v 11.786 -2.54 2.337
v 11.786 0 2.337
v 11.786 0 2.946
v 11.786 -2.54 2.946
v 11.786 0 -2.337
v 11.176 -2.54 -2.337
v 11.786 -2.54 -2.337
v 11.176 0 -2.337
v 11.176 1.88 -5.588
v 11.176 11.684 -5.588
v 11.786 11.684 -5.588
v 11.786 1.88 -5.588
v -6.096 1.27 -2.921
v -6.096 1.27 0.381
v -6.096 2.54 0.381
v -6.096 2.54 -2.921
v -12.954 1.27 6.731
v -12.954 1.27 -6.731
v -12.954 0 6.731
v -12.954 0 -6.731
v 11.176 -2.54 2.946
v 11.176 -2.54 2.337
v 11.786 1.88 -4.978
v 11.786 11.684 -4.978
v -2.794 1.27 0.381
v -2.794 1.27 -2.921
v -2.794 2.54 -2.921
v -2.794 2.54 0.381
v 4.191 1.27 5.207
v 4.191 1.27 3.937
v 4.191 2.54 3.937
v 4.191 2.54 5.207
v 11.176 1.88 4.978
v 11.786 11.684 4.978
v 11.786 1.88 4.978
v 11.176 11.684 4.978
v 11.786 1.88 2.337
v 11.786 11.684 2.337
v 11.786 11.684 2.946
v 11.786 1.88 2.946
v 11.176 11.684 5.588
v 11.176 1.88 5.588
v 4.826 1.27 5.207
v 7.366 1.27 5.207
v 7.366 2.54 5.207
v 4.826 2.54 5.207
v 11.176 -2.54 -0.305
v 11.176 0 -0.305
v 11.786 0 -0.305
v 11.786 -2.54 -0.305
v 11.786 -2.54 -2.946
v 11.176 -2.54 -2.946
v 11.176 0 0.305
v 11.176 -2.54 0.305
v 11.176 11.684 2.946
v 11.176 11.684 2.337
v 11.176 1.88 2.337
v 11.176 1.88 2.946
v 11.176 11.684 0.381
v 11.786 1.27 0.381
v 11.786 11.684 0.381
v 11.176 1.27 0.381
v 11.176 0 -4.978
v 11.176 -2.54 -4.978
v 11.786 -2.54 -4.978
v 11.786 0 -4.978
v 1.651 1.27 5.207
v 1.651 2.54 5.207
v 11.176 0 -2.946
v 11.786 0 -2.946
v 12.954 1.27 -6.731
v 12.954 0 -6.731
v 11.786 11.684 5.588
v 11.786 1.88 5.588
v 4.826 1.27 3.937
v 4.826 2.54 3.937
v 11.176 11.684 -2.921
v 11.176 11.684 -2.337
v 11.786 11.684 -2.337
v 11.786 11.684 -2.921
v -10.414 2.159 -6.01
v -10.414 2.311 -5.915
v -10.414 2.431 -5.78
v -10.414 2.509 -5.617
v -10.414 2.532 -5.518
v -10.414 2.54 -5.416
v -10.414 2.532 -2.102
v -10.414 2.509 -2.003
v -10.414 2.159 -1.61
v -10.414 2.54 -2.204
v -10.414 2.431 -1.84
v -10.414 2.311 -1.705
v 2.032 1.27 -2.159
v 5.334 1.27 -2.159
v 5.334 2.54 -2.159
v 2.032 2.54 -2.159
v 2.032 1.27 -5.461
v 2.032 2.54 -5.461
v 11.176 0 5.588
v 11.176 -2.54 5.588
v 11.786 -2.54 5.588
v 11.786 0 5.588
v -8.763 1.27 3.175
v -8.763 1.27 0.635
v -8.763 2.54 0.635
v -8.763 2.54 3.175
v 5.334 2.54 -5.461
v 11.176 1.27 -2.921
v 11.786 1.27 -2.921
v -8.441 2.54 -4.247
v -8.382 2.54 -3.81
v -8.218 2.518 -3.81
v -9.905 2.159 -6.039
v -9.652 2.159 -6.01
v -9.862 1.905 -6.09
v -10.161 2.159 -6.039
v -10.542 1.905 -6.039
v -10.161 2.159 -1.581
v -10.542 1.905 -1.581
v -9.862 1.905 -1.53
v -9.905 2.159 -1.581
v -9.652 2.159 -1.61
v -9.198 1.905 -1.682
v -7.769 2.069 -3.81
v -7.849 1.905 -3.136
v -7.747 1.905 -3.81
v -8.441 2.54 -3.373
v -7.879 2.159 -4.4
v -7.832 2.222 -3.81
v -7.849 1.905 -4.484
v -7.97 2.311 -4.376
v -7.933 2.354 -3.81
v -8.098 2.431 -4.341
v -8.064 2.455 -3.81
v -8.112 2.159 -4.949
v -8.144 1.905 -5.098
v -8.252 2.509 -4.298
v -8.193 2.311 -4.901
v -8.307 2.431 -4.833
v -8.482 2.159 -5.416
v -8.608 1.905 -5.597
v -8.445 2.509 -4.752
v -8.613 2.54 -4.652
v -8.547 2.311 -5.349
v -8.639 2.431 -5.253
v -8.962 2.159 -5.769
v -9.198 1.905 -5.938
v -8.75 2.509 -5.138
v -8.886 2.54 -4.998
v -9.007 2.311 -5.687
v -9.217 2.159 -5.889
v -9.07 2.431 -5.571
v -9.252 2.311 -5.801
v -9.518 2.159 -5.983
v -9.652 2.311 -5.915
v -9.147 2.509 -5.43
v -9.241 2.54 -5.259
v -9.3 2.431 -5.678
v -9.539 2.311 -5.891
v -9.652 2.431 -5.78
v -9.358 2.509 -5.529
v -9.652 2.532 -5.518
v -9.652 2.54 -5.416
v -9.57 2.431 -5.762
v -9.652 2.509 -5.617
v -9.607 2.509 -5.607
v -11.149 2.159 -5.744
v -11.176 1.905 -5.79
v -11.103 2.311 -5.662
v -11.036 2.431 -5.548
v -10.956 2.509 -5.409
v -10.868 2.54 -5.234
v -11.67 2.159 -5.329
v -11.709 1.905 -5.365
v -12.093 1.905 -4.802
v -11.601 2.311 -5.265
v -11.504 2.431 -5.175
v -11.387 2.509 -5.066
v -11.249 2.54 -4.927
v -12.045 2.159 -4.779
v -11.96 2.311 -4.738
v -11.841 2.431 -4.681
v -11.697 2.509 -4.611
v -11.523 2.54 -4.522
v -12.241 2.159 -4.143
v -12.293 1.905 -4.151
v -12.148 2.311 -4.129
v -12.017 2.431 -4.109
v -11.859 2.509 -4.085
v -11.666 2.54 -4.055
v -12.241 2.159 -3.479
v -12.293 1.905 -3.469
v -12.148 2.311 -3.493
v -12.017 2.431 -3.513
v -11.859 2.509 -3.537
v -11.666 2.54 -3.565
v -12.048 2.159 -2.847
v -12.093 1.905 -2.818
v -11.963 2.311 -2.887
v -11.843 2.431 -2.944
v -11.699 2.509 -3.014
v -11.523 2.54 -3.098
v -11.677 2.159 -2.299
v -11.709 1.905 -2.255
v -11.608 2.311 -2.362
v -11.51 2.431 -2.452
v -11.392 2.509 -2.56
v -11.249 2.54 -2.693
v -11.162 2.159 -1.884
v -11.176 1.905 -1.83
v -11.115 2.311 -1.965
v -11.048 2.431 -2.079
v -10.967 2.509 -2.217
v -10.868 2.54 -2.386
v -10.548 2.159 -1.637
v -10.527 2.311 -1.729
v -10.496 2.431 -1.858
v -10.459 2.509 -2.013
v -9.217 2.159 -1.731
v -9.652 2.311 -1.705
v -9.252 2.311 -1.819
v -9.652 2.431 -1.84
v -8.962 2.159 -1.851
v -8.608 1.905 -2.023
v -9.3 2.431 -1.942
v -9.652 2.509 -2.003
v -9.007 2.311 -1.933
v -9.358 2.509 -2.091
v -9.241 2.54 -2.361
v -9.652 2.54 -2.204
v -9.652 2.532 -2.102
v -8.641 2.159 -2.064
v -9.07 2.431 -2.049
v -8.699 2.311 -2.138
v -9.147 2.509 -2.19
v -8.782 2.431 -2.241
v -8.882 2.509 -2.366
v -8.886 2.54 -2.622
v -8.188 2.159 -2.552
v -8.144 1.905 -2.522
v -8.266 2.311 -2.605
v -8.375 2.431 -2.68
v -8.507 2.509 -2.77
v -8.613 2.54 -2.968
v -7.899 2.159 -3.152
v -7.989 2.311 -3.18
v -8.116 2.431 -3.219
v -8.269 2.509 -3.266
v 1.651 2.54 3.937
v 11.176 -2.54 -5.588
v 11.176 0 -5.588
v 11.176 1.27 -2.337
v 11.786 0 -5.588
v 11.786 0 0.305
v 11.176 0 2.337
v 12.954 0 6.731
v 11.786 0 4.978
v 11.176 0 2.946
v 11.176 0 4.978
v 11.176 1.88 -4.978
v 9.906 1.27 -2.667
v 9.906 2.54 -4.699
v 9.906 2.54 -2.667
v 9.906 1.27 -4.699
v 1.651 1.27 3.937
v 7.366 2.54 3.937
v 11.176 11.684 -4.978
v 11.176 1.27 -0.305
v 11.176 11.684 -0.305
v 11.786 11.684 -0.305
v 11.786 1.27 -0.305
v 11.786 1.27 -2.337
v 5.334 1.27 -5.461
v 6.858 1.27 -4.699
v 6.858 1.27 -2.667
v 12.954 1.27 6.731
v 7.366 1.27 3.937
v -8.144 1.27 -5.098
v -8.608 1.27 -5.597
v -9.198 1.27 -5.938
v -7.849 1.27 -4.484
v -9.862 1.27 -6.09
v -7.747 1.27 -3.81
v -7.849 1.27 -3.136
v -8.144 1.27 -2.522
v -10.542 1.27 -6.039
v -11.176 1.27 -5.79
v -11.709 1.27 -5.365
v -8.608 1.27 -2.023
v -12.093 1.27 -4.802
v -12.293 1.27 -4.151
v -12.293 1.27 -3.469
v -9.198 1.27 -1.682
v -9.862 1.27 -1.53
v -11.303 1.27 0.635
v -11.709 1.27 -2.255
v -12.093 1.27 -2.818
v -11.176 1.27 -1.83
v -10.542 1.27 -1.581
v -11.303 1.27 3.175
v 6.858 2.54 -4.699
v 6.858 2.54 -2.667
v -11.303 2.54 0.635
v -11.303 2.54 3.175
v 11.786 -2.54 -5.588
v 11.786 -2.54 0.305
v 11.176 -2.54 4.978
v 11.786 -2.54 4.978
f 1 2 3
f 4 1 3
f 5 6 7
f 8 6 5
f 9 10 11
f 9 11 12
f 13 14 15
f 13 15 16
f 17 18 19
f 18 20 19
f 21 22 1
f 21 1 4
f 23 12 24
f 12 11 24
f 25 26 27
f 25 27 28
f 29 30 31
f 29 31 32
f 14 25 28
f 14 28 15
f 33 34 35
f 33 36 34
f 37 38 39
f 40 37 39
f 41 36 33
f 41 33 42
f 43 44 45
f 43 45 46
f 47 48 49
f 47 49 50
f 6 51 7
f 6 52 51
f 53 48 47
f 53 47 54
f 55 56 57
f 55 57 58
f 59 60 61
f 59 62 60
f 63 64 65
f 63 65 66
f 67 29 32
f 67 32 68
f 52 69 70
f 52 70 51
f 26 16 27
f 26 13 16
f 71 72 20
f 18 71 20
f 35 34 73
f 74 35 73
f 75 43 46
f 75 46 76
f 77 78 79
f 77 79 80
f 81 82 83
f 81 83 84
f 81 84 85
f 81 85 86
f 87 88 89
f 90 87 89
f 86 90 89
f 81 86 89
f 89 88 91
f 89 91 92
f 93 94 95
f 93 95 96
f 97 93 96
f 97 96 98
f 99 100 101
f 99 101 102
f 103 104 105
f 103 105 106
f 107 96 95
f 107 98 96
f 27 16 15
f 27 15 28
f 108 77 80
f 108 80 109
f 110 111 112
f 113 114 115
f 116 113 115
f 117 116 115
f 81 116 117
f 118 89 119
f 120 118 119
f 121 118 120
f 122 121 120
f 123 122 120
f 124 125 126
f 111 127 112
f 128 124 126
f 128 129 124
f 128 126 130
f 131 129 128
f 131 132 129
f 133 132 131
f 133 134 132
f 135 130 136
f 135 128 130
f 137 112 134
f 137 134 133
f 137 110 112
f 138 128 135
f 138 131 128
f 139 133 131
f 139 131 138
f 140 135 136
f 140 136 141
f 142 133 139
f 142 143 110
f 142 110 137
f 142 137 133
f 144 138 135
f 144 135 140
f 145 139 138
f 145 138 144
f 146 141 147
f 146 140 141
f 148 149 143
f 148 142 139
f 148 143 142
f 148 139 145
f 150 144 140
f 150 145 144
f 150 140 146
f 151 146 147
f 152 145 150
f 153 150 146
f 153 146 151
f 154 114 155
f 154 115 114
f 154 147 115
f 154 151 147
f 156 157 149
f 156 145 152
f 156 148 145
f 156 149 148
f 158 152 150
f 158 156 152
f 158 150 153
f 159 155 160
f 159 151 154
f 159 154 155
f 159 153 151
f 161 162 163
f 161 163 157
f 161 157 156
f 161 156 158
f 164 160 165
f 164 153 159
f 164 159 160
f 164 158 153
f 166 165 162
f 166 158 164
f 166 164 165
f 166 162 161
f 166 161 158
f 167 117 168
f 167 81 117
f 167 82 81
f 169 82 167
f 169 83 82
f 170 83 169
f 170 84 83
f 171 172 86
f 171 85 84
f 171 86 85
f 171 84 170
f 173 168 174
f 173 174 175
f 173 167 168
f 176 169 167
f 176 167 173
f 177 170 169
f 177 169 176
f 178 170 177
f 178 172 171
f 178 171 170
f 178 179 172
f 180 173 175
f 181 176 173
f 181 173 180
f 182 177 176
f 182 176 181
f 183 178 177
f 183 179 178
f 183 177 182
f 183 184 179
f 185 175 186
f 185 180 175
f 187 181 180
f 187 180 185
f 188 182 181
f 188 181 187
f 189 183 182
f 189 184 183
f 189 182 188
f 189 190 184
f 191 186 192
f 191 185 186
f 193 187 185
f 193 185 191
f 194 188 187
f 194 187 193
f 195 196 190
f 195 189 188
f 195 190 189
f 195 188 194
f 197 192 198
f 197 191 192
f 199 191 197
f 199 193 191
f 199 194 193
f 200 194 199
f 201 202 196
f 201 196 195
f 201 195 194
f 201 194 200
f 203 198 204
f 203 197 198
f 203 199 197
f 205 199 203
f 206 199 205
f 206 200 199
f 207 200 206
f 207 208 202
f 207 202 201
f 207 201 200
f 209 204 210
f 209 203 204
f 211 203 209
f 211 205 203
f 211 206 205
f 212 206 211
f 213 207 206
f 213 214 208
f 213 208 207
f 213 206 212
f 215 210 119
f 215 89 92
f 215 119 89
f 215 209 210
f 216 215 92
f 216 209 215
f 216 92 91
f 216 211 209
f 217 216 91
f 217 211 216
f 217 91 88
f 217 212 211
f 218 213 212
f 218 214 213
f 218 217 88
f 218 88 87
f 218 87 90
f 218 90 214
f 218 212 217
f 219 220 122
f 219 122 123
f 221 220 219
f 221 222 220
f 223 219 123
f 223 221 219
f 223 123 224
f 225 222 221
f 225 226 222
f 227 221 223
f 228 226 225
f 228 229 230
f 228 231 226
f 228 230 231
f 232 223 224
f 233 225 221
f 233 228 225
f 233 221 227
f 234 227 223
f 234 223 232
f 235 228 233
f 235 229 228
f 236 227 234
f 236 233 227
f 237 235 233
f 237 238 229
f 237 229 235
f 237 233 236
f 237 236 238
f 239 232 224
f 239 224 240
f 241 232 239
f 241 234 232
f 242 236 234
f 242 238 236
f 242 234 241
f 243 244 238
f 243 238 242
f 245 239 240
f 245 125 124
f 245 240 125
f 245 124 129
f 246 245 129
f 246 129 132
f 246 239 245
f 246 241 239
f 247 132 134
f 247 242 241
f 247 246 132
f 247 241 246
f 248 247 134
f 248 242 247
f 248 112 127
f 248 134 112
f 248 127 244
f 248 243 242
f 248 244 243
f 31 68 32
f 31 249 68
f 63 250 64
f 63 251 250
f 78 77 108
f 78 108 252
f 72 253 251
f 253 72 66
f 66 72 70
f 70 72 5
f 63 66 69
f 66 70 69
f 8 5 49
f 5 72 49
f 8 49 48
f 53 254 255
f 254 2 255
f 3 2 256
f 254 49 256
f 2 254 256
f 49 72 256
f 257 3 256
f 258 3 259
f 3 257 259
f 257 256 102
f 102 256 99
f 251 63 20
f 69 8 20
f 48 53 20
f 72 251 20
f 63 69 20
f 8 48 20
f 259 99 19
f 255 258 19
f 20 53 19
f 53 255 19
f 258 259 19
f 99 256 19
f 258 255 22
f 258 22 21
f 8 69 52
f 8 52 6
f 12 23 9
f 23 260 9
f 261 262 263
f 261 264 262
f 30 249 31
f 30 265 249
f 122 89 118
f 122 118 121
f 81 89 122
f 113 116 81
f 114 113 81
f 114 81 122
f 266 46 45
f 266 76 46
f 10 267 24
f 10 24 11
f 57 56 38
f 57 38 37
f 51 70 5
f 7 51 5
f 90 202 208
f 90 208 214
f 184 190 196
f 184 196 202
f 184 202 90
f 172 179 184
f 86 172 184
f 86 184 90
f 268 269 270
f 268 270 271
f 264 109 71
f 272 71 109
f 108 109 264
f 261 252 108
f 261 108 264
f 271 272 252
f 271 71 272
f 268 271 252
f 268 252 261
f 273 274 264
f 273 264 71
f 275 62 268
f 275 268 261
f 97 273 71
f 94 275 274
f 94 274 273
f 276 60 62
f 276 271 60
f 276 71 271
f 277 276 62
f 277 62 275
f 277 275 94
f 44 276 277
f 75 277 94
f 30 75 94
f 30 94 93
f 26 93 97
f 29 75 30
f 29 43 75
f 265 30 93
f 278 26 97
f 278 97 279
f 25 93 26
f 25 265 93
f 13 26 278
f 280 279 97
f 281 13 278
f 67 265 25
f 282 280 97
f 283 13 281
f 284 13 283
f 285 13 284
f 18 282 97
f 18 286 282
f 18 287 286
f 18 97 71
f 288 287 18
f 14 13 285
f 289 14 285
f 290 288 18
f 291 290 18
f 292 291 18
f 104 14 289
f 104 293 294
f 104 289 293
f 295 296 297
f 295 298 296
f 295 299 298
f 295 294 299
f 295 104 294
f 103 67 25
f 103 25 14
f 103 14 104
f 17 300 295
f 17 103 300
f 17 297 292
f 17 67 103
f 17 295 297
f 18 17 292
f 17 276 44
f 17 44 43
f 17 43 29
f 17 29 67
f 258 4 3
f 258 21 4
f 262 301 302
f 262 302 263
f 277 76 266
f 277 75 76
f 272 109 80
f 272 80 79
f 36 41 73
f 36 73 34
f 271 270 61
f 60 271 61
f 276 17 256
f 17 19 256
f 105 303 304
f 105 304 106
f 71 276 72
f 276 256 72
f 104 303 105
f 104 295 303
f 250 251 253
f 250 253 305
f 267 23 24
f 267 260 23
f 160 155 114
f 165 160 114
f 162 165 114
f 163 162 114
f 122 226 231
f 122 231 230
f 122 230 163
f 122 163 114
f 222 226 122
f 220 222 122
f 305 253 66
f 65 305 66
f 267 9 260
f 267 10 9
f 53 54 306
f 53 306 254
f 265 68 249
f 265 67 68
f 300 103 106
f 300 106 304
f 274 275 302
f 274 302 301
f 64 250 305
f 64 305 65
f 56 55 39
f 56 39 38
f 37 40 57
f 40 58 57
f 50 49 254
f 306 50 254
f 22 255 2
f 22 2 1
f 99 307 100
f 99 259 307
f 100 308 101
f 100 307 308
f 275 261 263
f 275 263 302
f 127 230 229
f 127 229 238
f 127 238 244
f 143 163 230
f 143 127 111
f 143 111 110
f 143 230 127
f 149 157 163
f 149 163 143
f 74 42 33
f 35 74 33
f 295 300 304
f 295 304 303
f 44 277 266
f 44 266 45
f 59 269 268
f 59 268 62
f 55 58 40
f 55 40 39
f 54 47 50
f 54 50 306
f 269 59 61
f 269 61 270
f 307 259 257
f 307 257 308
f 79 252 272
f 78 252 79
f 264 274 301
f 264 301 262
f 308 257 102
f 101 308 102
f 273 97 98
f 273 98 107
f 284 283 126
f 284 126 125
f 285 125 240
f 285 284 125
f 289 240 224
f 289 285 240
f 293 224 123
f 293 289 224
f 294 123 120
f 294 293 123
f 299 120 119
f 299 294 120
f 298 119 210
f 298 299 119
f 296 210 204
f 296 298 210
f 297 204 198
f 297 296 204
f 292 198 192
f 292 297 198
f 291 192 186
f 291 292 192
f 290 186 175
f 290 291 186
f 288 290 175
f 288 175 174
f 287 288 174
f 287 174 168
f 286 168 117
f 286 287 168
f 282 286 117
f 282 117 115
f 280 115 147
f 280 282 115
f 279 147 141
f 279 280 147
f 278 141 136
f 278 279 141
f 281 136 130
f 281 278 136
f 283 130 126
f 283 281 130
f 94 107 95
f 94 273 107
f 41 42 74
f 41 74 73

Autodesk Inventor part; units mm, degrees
ref_plane "YZ Plane" through (0, 0, 0) normal (1, 0, 0) x (0, 1, 0)
ref_plane "XZ Plane" through (0, 0, 0) normal (0, 1, 0) x (-1, 0, 0)
sketch "Sketch1" plane through (0, 0, 0) normal (0, 1, 0) x (-1, 0, 0)
  line L0 (12.954, 6.731) -> (-12.954, 6.731)
  line L1 (-12.954, 6.731) -> (-12.954, -6.731)
  line L2 (-12.954, -6.731) -> (12.954, -6.731)
  line L3 (12.954, -6.731) -> (12.954, 6.731)
  point P0 (0, 0)
  point P1 (12.954, 0)
  point P2 (0, -6.731)
  dimension "d0" = 25.908
  dimension "d1" = 13.462
extrude "Extrusion1" add sketch "Sketch1" along normal blind 1.27
sketch "Sketch2" plane through (0, 1.27, 0) normal (0, 1, 0) x (1, 0, 0)
  circle A0 centre (-10.033, 3.81) radius 2.286
  line L0 (-12.954, 6.731) -> (-12.954, -6.731) projected
  line L1 (-11.303, -0.635) -> (-8.763, -0.635)
  line L2 (-8.763, -0.635) -> (-8.763, -3.175)
  line L3 (-8.763, -3.175) -> (-11.303, -3.175)
  line L4 (-11.303, -3.175) -> (-11.303, -0.635)
  line L5 (-12.954, -6.731) -> (12.954, -6.731) projected
  line L6 (-6.096, 2.921) -> (-2.794, 2.921)
  line L7 (-2.794, 2.921) -> (-2.794, -0.381)
  line L8 (-2.794, -0.381) -> (-6.096, -0.381)
  line L9 (-6.096, -0.381) -> (-6.096, 2.921)
  line L10 (12.954, 6.731) -> (-12.954, 6.731) projected
  line L11 (2.032, 5.461) -> (5.334, 5.461)
  line L12 (5.334, 5.461) -> (5.334, 2.159)
  line L13 (5.334, 2.159) -> (2.032, 2.159)
  line L14 (2.032, 2.159) -> (2.032, 5.461)
  line L15 (12.954, -6.731) -> (12.954, 6.731) projected
  line L16 (6.858, 4.699) -> (9.906, 4.699)
  line L17 (9.906, 4.699) -> (9.906, 2.667)
  line L18 (9.906, 2.667) -> (6.858, 2.667)
  line L19 (6.858, 2.667) -> (6.858, 4.699)
  line L20 (1.651, -3.937) -> (4.191, -3.937)
  line L21 (4.191, -3.937) -> (4.191, -5.207)
  line L22 (4.191, -5.207) -> (1.651, -5.207)
  line L23 (1.651, -5.207) -> (1.651, -3.937)
  line L24 (4.826, -3.937) -> (7.366, -3.937)
  line L25 (7.366, -3.937) -> (7.366, -5.207)
  line L26 (7.366, -5.207) -> (4.826, -5.207)
  line L27 (4.826, -5.207) -> (4.826, -3.937)
  point P0 (0, 0)
  point P1 (-10.033, -0.635)
  dimension "d5" = 4.572
  dimension "d9" = 2.921
  dimension "d10" = 3.81
  dimension "d11" = 2.54
  dimension "d12" = 2.54
  dimension "d13" = 3.556
  dimension "d14" = 3.302
  dimension "d15" = 3.302
  dimension "d16" = 6.858
  dimension "d17" = 3.81
  dimension "d18" = 3.302
  dimension "d19" = 3.302
  dimension "d20" = 7.62
  dimension "d21" = 1.27
  dimension "d22" = 3.048
  dimension "d23" = 2.032
  dimension "d24" = 2.032
  dimension "d25" = 3.048
  dimension "d26" = 1.524
  dimension "d27" = 2.54
  dimension "d28" = 2.54
  dimension "d29" = 1.27
  dimension "d30" = 0.635
  dimension "d31" = 5.588
extrude "Extrusion2" add sketch "Sketch2" along normal blind 1.27 contours A0 | L1 L2 L3 L4 | L6 L7 L8 L9 | L11 L12 L13 L14 | L16 L17 L18 L19 | L20 L21 L22 L23 | L24 L25 L26 L27
fillet "Fillet1" radius 0.635 1 edges at (-12.319, 2.54, -3.81)
sketch "Sketch3" plane through (-10.033, 2.54, -3.81) normal (0, 1, 0) x (1, 0, 0)
  circle A0 centre (0, 0) radius 2.286 projected
  line L0 (-0.381, 2.254) -> (-0.381, -2.254)
  line L1 (0.381, 2.254) -> (0.381, -2.254)
  point P0 (10.033, -3.81)
  dimension "d35" = 0.762
  dimension "d36" = 0.381
extrude "Extrusion3" cut sketch "Sketch3" against normal blind 0.381 contours L1 A0 L0
ref_plane "Work Plane1" through (11.176, 1.5748, -5.588) normal (-1, 0, 0) x (0, 0, 1)
sketch "Sketch5" plane through (11.176, 1.5748, -5.588) normal (-1, 0, 0) x (0, 0, 1)
  line L0 (10.5664, -0.3048) -> (11.176, -0.3048) projected
  line L1 (10.5664, -0.3048) -> (10.5664, 0.3048) projected
  line L2 (11.176, 0.3048) -> (10.5664, 0.3048) projected
  line L3 (11.176, -0.3048) -> (11.176, 0.3048) projected
  line L4 (7.9248, -0.3048) -> (8.5344, -0.3048) projected
  line L5 (7.9248, -0.3048) -> (7.9248, 0.3048) projected
  line L6 (8.5344, 0.3048) -> (7.9248, 0.3048) projected
  line L7 (8.5344, -0.3048) -> (8.5344, 0.3048) projected
  line L8 (5.2832, -0.3048) -> (5.8928, -0.3048) projected
  line L9 (5.2832, -0.3048) -> (5.2832, 0.3048) projected
  line L10 (5.8928, 0.3048) -> (5.2832, 0.3048) projected
  line L11 (5.8928, -0.3048) -> (5.8928, 0.3048) projected
  line L12 (2.6416, -0.3048) -> (3.2512, -0.3048) projected
  line L13 (2.6416, -0.3048) -> (2.6416, 0.3048) projected
  line L14 (3.2512, 0.3048) -> (2.6416, 0.3048) projected
  line L15 (3.2512, -0.3048) -> (3.2512, 0.3048) projected
  line L16 (0, -0.3048) -> (0.6096, -0.3048) projected
  line L17 (0, -0.3048) -> (0, 0.3048) projected
  line L18 (0.6096, 0.3048) -> (0, 0.3048) projected
  line L19 (0.6096, -0.3048) -> (0.6096, 0.3048) projected
  line L20 (11.176, -0.3048) -> (10.5664, -0.3048)
  line L21 (10.5664, -0.3048) -> (10.5664, -4.1148)
  line L22 (10.5664, -4.1148) -> (11.176, -4.1148)
  line L23 (11.176, -4.1148) -> (11.176, -0.3048)
  line L24 (8.5344, -0.3048) -> (7.9248, -0.3048)
  line L25 (7.9248, -0.3048) -> (7.9248, -4.1148)
  line L26 (7.9248, -4.1148) -> (8.5344, -4.1148)
  line L27 (8.5344, -4.1148) -> (8.5344, -0.3048)
  line L28 (5.8928, -0.3048) -> (5.2832, -0.3048)
  line L29 (5.2832, -0.3048) -> (5.2832, -4.1148)
  line L30 (5.2832, -4.1148) -> (5.8928, -4.1148)
  line L31 (5.8928, -4.1148) -> (5.8928, -0.3048)
  line L32 (3.2512, -0.3048) -> (2.6416, -0.3048)
  line L33 (2.6416, -0.3048) -> (2.6416, -4.1148)
  line L34 (2.6416, -4.1148) -> (3.2512, -4.1148)
  line L35 (3.2512, -4.1148) -> (3.2512, -0.3048)
  line L36 (0.6096, -0.3048) -> (0, -0.3048)
  line L37 (0, -0.3048) -> (0, -4.1148)
  line L38 (0, -4.1148) -> (0.6096, -4.1148)
  line L39 (0.6096, -4.1148) -> (0.6096, -0.3048)
  line L40 (11.176, -0.3048) -> (11.176, 10.1092)
  line L41 (11.176, 10.1092) -> (10.5664, 10.1092)
  line L42 (10.5664, 10.1092) -> (10.5664, -0.3048)
  line L43 (8.5344, -0.3048) -> (8.5344, 10.1092)
  line L44 (8.5344, 10.1092) -> (7.9248, 10.1092)
  line L45 (7.9248, 10.1092) -> (7.9248, -0.3048)
  line L46 (5.969, -0.3048) -> (2.667, -0.3048) projected
  line L47 (5.969, -0.3048) -> (5.969, 10.1092)
  line L48 (5.969, 10.1092) -> (5.2832, 10.1092)
  line L49 (5.2832, 10.1092) -> (5.2832, -0.3048)
  line L50 (3.2512, -0.3048) -> (3.2512, 10.1092)
  line L51 (3.2512, 10.1092) -> (2.667, 10.1092)
  line L52 (2.667, 10.1092) -> (2.667, -0.3048)
  line L53 (-1.143, -0.3048) -> (12.319, -0.3048) projected
  line L54 (2.667, -0.3048) -> (0.6096, -0.3048)
  line L55 (0.6096, -0.3048) -> (0.6096, 10.1092)
  line L56 (0.6096, 10.1092) -> (0, 10.1092)
  line L57 (0, 10.1092) -> (0, -0.3048)
  point P0 (5.588, -1.5748)
  dimension "d56" = 3.81
  dimension "d62" = 0.6096
  dimension "d63" = 3.2512
  dimension "d64" = 5.8928
  dimension "d65" = 8.5344
  dimension "d66" = 11.176
  dimension "d70" = 10.414
extrude "Extrusion5" add sketch "Sketch5" against normal blind 0.6096 contours L0 L23 L22 L21 | L39 L38 L37 L16 | L35 L34 L33 L12 | L12 L52 L14 L15 | L46 L11 L10 L49 L48 L47 | L27 L26 L25 L4 | L42 L41 L40 L2 | L6 L45 L44 L43 | L31 L30 L29 L8 | L8 L9 L10 L11 | L14 L52 L51 L50 | L18 L57 L56 L55
equation "\"d12\" = d11"
equation "\"d15\" = d14"
equation "\"d18\" = d14"
equation "\"d19\" = d18"
equation "\"d28\" = d27"
equation "\"d36\" = 0.5 * d35"
properties part number "IMU"
